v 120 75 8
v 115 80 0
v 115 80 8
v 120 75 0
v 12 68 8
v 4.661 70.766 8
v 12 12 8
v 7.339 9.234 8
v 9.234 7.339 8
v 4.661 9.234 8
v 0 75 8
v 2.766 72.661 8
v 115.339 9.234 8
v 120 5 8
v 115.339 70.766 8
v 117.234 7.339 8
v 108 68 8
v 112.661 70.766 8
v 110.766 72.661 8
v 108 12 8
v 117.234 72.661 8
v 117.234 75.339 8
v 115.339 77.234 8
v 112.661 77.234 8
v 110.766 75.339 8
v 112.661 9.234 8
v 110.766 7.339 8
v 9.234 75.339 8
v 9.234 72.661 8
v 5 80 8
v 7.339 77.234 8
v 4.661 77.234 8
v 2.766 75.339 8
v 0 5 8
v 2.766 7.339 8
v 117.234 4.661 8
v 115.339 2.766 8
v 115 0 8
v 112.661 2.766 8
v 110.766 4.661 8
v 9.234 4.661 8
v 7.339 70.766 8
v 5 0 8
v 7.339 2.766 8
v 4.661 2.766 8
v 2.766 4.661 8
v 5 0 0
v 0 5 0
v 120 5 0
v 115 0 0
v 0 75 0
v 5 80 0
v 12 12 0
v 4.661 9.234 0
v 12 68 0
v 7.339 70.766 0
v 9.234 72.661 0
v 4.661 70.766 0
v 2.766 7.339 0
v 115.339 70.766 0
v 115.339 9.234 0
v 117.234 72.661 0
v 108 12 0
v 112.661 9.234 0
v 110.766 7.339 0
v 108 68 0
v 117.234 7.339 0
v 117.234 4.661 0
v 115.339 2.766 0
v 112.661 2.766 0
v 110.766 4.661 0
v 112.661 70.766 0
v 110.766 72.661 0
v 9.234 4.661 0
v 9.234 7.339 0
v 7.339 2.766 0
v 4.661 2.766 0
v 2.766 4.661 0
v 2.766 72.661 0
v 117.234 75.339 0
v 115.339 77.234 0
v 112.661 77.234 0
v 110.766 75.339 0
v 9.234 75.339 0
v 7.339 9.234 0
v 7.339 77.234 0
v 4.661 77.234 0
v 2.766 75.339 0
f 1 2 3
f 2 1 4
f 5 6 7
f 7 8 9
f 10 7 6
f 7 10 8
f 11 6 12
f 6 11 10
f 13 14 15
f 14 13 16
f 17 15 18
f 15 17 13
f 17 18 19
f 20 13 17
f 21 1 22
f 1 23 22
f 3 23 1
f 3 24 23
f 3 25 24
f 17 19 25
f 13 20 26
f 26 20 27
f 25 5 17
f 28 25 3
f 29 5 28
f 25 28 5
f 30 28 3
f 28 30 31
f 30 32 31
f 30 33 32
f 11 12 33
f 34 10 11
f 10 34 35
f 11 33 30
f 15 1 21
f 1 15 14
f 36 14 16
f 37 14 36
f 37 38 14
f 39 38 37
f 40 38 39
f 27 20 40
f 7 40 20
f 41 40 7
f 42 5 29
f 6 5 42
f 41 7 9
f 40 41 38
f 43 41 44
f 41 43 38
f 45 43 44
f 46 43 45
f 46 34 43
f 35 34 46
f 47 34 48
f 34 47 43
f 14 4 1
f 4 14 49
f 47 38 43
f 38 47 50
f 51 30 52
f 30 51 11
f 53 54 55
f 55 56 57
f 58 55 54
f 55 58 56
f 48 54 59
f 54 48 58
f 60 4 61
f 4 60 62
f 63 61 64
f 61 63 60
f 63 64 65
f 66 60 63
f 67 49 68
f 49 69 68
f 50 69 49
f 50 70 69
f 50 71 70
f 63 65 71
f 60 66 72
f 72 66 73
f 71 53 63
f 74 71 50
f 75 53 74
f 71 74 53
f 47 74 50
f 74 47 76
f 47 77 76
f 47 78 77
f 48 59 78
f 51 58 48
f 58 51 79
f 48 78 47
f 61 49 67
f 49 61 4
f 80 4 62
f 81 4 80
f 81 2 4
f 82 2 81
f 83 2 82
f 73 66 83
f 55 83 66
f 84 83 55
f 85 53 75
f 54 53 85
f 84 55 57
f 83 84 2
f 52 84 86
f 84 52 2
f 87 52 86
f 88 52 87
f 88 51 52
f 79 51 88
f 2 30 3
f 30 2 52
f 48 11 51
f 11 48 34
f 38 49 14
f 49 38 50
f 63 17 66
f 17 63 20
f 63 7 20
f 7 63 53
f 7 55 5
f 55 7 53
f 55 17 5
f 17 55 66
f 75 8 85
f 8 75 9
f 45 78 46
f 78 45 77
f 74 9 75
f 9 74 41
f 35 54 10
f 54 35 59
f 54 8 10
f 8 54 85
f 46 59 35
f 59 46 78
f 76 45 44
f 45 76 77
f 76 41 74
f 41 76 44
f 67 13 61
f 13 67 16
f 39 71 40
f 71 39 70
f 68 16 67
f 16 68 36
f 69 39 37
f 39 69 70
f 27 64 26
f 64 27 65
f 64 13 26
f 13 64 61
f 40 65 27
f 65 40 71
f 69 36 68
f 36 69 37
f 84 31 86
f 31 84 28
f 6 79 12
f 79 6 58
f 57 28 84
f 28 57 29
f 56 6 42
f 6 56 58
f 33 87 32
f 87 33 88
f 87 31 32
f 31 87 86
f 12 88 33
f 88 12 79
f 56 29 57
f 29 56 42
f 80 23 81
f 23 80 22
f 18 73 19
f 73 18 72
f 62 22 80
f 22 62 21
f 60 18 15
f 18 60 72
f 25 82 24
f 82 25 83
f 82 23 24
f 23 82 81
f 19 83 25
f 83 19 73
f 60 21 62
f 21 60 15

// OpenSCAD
$fn = 32;

// ----------------------------------------------------------------------
// Frame plate: 120 x 80 frame, 12 mm rails
// ----------------------------------------------------------------------

// --- parameters (mm) ---
plate_l = 120;            // plate length, X
plate_w = 80;             // plate width, Y
plate_t = 8;              // plate thickness, Z (extrusion height)
corner_c = 5;             // corner chamfer
frame_bar = 12;           // frame rail width
bolt_r = 3.5;             // corner bolt window radius
bolt_inset = 6;           // bolt centre inset from the edges

win_l = plate_l - 2 * frame_bar;  // window length
win_w = plate_w - 2 * frame_bar;  // window width
bolt_d = 2 * bolt_r;  // corner hole diameter

profile = [[5, 0], [115, 0], [120, 5], [120, 75], [115, 80], [5, 80], [0, 75], [0, 5]];  // primary outline, 8 points, counter clockwise
void_1 = [[12, 12], [108, 12], [108, 68], [12, 68]];  // the window, 4 points
void_2 = [[9.234, 7.339], [7.339, 9.234], [4.661, 9.234], [2.766, 7.339], [2.766, 4.661], [4.661, 2.766], [7.339, 2.766], [9.234, 4.661]];  // corner bolt window, 8 points
void_3 = [[117.234, 7.339], [115.339, 9.234], [112.661, 9.234], [110.766, 7.339], [110.766, 4.661], [112.661, 2.766], [115.339, 2.766], [117.234, 4.661]];  // corner bolt window, 8 points
void_4 = [[9.234, 75.339], [7.339, 77.234], [4.661, 77.234], [2.766, 75.339], [2.766, 72.661], [4.661, 70.766], [7.339, 70.766], [9.234, 72.661]];  // corner bolt window, 8 points
void_5 = [[117.234, 75.339], [115.339, 77.234], [112.661, 77.234], [110.766, 75.339], [110.766, 72.661], [112.661, 70.766], [115.339, 70.766], [117.234, 72.661]];  // corner bolt window, 8 points

// --- the one profile operation ---
difference() {
  linear_extrude(height = plate_t) polygon(points = profile);
  translate([0, 0, -1])
    linear_extrude(height = plate_t + 2) polygon(points = void_1);
  translate([0, 0, -1])
    linear_extrude(height = plate_t + 2) polygon(points = void_2);
  translate([0, 0, -1])
    linear_extrude(height = plate_t + 2) polygon(points = void_3);
  translate([0, 0, -1])
    linear_extrude(height = plate_t + 2) polygon(points = void_4);
  translate([0, 0, -1])
    linear_extrude(height = plate_t + 2) polygon(points = void_5);
}
